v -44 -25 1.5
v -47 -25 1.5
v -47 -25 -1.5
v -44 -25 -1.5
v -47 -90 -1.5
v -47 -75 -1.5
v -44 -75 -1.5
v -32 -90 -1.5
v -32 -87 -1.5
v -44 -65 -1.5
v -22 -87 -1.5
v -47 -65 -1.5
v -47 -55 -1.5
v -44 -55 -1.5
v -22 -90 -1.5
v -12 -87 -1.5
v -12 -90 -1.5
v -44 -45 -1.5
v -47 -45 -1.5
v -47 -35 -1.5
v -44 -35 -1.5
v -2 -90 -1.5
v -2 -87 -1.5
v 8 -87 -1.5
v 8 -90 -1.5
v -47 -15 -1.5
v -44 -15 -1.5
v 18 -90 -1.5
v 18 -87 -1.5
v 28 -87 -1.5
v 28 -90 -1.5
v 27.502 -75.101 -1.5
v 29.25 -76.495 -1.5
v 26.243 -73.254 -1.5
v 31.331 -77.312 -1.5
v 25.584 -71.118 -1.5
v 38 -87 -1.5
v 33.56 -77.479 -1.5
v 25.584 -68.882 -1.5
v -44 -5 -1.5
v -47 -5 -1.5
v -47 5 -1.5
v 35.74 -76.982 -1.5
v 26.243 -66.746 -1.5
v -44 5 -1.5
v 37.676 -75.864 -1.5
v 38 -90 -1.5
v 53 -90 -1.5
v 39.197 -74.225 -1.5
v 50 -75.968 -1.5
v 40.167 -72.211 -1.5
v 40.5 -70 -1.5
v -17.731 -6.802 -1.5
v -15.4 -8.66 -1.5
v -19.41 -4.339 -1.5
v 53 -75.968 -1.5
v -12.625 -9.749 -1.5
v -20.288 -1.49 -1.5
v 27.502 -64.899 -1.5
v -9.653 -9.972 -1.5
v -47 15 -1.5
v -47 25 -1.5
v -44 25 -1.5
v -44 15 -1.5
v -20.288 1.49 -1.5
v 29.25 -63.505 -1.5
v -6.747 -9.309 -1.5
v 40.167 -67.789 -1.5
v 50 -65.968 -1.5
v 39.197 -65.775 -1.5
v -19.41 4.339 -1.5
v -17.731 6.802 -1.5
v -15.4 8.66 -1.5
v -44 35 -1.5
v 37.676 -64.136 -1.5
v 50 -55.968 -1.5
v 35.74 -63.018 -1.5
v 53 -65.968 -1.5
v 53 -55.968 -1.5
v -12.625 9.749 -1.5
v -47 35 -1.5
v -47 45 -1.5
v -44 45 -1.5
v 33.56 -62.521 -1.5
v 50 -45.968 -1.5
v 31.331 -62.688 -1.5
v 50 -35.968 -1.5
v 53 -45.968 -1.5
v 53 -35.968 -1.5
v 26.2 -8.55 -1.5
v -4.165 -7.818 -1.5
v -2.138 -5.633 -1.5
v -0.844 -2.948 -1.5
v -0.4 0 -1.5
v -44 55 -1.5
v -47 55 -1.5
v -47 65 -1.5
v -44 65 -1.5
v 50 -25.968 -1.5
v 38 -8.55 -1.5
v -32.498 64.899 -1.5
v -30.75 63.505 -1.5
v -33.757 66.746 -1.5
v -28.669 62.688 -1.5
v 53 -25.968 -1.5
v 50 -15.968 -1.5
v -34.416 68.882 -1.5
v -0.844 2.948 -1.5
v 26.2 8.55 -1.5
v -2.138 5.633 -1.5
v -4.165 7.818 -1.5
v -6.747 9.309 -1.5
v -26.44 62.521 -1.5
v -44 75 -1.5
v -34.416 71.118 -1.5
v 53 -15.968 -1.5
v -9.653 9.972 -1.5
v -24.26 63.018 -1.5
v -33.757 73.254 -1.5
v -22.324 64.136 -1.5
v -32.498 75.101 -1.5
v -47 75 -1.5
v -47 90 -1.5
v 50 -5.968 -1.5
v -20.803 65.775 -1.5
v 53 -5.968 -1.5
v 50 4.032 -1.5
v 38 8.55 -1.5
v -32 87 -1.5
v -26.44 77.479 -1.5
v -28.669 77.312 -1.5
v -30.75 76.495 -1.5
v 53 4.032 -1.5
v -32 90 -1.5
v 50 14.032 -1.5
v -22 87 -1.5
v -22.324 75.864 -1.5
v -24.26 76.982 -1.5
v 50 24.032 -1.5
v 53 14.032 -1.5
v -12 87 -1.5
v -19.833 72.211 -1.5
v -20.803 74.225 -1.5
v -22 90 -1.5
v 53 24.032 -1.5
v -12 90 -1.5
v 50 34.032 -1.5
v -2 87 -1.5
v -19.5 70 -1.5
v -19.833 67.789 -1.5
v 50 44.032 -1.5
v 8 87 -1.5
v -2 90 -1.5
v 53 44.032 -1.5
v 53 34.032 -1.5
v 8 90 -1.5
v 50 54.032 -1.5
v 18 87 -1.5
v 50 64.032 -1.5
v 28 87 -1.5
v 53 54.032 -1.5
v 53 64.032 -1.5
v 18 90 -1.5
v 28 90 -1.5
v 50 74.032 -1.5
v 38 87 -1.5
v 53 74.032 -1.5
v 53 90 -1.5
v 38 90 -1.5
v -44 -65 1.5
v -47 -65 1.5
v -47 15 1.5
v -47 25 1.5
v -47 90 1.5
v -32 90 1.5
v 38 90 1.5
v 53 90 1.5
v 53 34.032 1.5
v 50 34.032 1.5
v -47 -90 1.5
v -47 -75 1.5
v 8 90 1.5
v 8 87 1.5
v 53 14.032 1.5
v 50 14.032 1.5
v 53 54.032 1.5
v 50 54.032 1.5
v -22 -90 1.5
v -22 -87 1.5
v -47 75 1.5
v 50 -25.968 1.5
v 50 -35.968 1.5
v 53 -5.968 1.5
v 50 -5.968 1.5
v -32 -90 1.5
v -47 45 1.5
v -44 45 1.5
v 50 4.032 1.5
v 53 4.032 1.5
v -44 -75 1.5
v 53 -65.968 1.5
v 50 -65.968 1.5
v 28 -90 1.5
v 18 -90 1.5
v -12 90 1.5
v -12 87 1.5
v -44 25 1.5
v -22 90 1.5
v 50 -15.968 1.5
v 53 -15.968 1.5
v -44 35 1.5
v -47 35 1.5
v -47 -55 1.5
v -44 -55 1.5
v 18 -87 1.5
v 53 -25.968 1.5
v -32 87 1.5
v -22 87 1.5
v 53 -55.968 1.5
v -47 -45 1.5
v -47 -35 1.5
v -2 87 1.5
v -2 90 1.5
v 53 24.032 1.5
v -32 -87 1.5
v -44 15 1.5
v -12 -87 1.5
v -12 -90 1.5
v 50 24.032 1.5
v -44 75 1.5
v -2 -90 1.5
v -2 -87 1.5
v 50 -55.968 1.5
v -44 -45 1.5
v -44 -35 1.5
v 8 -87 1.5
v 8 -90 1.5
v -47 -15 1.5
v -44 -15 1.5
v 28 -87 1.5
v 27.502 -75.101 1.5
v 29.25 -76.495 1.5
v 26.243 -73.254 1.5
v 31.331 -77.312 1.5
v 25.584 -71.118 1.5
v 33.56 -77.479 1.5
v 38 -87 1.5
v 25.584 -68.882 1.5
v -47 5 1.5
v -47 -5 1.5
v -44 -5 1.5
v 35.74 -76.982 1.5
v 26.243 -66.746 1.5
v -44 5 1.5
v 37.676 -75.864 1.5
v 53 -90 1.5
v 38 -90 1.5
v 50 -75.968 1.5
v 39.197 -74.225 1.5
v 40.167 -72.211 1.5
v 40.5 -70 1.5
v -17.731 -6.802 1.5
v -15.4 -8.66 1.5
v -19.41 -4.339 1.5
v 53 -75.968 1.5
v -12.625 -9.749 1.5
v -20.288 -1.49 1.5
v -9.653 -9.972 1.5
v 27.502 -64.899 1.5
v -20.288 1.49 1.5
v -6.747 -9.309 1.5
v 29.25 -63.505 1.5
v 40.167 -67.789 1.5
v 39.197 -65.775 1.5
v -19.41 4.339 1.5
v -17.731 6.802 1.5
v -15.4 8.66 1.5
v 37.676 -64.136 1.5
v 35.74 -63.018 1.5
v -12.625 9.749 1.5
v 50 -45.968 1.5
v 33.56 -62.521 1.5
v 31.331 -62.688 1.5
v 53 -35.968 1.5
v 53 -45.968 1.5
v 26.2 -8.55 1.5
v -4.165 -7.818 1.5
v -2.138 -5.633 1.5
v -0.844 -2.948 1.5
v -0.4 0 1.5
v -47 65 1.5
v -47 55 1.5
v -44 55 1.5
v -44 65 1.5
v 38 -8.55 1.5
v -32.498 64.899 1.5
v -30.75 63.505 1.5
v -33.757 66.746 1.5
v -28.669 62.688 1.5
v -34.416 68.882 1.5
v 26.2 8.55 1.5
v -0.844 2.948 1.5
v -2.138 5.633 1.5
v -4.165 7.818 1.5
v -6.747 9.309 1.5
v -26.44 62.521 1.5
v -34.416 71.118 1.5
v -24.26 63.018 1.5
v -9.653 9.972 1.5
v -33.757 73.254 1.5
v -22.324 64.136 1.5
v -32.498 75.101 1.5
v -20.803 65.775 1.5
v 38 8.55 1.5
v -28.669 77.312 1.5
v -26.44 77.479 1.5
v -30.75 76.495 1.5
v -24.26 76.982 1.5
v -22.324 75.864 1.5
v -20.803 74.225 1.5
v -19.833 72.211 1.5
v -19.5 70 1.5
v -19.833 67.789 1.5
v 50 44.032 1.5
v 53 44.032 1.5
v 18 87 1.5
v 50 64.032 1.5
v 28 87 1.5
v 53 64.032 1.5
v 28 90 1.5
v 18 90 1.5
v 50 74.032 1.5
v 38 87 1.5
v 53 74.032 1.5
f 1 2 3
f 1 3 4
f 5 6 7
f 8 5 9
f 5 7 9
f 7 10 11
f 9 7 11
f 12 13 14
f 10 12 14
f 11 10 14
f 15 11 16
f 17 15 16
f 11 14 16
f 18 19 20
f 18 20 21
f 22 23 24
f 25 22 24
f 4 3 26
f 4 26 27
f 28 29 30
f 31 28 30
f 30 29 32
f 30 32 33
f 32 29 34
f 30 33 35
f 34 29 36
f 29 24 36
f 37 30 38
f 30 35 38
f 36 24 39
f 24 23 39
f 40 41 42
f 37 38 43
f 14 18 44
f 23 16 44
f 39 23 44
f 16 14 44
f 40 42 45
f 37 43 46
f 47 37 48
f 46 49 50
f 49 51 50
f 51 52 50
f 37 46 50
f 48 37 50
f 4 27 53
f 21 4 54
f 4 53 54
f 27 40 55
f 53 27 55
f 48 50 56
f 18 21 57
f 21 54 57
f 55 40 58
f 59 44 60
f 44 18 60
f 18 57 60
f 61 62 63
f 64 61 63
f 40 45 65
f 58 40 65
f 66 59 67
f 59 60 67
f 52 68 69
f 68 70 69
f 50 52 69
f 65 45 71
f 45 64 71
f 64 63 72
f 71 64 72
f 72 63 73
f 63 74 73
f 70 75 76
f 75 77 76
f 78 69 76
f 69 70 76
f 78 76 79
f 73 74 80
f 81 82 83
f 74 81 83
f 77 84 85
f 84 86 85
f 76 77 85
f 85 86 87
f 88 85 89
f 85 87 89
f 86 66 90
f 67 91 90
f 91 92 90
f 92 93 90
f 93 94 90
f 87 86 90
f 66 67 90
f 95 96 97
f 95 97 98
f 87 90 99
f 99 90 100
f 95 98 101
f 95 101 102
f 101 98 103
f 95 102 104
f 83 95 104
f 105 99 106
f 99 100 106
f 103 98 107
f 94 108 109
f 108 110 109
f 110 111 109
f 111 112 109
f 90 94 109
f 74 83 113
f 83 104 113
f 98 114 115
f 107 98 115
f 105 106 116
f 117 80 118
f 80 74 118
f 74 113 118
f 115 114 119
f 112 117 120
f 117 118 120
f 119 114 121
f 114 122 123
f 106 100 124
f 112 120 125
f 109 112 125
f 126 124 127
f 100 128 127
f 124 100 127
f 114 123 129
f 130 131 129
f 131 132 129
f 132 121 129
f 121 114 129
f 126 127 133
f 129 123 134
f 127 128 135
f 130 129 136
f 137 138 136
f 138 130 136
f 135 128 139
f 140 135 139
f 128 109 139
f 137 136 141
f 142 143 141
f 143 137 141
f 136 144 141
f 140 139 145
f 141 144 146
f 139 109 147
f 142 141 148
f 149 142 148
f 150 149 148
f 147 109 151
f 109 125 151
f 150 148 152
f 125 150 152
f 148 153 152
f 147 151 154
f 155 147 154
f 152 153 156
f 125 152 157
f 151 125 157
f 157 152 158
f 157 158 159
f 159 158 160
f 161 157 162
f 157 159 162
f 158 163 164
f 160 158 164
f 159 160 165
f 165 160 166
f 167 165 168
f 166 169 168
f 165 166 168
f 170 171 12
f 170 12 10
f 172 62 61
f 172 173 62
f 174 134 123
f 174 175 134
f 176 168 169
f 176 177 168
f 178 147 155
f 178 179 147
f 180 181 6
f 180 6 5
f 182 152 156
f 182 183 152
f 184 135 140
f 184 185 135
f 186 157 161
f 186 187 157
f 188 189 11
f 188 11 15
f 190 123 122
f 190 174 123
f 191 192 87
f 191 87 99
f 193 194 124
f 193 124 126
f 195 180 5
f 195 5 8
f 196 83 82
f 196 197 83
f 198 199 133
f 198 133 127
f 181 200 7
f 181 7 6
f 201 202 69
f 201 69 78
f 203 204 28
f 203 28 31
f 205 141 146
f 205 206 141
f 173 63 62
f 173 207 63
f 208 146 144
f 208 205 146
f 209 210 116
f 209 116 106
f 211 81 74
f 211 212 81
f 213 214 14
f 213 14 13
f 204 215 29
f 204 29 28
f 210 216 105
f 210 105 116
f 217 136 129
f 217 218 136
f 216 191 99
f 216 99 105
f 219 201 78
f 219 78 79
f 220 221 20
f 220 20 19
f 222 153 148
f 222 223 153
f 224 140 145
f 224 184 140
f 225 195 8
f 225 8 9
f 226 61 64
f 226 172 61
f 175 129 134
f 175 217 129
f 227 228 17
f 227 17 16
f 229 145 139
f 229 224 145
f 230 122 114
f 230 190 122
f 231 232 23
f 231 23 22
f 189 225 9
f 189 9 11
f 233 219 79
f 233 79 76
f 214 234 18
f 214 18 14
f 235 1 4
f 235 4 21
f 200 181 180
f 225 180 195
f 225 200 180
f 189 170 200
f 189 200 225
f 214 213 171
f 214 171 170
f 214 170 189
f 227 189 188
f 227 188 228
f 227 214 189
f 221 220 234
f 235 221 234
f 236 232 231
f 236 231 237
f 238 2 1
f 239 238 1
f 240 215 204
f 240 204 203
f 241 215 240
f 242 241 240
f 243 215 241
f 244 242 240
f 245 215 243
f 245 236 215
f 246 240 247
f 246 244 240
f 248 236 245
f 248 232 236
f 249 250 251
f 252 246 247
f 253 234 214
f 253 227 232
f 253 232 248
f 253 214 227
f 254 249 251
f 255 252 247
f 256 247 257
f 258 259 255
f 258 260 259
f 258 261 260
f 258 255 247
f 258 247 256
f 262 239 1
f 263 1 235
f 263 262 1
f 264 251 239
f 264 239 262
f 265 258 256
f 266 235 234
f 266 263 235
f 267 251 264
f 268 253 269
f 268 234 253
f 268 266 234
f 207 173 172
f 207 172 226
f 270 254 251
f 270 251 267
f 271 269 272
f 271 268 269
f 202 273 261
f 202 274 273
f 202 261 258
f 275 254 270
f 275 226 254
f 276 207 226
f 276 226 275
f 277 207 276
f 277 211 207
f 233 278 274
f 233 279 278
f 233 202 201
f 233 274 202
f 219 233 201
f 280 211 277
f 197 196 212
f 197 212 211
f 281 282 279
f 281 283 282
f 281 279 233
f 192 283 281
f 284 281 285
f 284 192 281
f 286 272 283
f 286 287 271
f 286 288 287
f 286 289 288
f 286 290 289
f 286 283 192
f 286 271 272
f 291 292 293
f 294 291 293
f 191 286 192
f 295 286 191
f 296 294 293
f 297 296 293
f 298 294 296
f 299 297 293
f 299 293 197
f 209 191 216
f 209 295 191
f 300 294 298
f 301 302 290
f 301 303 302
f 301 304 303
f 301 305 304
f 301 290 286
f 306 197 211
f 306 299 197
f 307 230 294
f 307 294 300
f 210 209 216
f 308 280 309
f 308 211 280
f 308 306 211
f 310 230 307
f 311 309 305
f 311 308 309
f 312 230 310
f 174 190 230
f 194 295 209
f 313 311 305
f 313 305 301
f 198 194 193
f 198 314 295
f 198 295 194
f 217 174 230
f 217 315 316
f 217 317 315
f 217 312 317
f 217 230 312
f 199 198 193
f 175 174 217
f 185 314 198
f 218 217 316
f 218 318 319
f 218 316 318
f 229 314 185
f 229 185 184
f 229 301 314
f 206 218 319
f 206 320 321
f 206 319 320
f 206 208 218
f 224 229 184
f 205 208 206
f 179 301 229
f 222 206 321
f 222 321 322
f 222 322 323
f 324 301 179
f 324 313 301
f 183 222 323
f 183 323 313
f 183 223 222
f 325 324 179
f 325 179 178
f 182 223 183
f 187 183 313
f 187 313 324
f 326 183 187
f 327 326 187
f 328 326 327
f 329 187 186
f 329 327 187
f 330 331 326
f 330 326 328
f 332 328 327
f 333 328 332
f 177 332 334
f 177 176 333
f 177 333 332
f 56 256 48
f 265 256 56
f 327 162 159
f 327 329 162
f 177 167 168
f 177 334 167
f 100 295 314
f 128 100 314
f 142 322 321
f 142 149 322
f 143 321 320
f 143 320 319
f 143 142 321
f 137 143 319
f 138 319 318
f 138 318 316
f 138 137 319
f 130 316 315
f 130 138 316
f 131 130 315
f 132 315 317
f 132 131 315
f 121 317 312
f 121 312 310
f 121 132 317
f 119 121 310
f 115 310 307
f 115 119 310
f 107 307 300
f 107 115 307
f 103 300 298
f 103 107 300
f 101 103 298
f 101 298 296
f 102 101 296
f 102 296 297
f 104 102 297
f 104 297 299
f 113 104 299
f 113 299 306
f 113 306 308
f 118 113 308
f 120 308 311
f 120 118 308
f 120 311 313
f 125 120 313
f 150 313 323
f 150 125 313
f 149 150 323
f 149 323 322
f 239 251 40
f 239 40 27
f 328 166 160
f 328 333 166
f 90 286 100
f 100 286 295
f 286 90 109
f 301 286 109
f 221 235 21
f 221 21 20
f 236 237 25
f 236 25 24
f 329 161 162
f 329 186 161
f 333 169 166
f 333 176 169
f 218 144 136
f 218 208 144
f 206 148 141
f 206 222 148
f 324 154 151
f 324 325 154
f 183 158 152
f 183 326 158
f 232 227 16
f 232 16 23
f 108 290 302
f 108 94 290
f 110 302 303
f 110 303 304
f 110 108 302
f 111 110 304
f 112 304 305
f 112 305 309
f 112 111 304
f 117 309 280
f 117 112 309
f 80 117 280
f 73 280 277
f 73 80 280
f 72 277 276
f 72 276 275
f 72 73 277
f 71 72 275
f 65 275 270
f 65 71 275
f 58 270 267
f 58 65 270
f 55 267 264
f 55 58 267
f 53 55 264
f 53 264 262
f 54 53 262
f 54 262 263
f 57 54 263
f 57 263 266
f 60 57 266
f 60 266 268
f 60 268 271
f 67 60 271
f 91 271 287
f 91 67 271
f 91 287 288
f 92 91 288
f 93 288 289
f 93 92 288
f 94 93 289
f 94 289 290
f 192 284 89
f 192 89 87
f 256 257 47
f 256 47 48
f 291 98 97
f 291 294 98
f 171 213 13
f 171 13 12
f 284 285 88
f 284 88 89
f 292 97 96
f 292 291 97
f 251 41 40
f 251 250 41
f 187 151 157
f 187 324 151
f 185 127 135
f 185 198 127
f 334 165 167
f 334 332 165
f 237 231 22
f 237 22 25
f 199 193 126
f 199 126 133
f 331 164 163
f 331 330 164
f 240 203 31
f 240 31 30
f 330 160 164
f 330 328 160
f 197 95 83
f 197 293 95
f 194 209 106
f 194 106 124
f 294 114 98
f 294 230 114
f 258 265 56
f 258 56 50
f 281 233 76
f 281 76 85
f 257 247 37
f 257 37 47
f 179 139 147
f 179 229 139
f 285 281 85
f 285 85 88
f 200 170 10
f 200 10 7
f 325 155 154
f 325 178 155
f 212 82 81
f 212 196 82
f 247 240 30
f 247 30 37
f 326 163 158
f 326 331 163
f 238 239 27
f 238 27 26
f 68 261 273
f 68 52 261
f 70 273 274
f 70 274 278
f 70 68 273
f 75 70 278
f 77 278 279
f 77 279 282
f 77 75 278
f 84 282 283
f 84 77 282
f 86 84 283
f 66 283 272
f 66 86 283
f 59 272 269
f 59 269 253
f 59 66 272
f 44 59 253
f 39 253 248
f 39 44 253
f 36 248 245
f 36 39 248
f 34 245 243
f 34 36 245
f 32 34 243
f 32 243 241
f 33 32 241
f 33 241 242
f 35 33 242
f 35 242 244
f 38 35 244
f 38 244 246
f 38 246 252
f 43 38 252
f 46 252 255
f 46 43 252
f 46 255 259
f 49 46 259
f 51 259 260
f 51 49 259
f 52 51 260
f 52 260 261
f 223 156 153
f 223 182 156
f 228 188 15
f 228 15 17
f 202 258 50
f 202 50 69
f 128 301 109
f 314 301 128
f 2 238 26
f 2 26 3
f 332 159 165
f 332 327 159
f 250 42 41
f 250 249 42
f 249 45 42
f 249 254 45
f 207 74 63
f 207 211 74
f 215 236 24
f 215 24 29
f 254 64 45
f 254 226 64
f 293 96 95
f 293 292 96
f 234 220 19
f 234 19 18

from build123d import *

# Parameters (mm, degrees)
F0_R     = 10
F0_R_2   = 7.5
F0_W     = 11.8
F0_H     = 17.1
F1_DEPTH = 1.5


# Not quite as in the source:
# - ends of sketch curves that miss each other by under 0.0002 mm in the source are joined


with BuildPart() as f1:
    # F0 (on Top) → F1 (new body, symmetric)
    with BuildSketch(Plane.XY):
        Polygon((-46.9999983907, 3.8743e-06), (-46.9999983907, -4.9999961257), (-43.9999983907, -4.9999961257), (-43.9999983907, -14.9999961257), (-46.9999983907, -14.9999961257), (-46.9999983907, -24.9999961257), (-43.9999983907, -24.9999961257), (-43.9999983907, -34.9999961257), (-46.9999983907, -34.9999961257), (-46.9999983907, -44.9999961257), (-43.9999983907, -44.9999961257), (-43.9999983907, -54.9999961257), (-46.9999983907, -54.9999961257), (-46.9999983907, -64.9999961257), (-43.9999983907, -64.9999961257), (-43.9999983907, -74.9999961257), (-46.9999983907, -74.9999961257), (-46.9999983907, -89.9999961257), (-31.9999983907, -89.9999961257), (-31.9999983907, -86.9999961257), (-21.9999983907, -86.9999961257), (-21.9999983907, -89.9999961257), (-11.9999983907, -89.9999961257), (-11.9999983907, -86.9999961257), (-1.9999983907, -86.9999961257), (-1.9999983907, -89.9999961257), (8.0000016093, -89.9999961257), (8.0000016093, -86.9999961257), (18.0000016093, -86.9999961257), (18.0000016093, -89.9999961257), (28.0000016093, -89.9999961257), (28.0000016093, -86.9999961257), (38.0000016093, -86.9999961257), (38.0000016093, -89.9999961257), (53.0000016093, -89.9999961257), (53.0000030994, -75.968132019), (50.0000030994, -75.968132019), (50.0000030994, -65.968132019), (53.0000030994, -65.968132019), (53.0000030994, -55.968132019), (50.0000030994, -55.968132019), (50.0000030994, -45.968132019), (53.0000030994, -45.968132019), (53.0000030994, -35.968132019), (50.0000030994, -35.968132019), (50.0000030994, -25.968132019), (53.0000030994, -25.968132019), (53.0000030994, -15.968132019), (50.0000030994, -15.968132019), (50.0000030994, -5.968132019), (53.0000030994, -5.968132019), (53.0000030994, 3.8743e-06), (53.0000030994, 4.031867981), (50.0000030994, 4.031867981), (50.0000030994, 14.031867981), (53.0000030994, 14.031867981), (53.0000030994, 24.031867981), (50.0000030994, 24.031867981), (50.0000030994, 34.031867981), (53.0000030994, 34.031867981), (53.0000030994, 44.031867981), (50.0000030994, 44.031867981), (50.0000030994, 54.031867981), (53.0000030994, 54.031867981), (53.0000030994, 64.031867981), (50.0000030994, 64.031867981), (50.0000030994, 74.031867981), (53.0000030994, 74.031867981), (53.0000030994, 90.0000038743), (38.0000016093, 90.0000035763), (38.0000016093, 87.0000035763), (28.0000016093, 87.0000035763), (28.0000016093, 90.0000035763), (18.0000016093, 90.0000035763), (18.0000016093, 87.0000035763), (8.0000016093, 87.0000035763), (8.0000016093, 90.0000035763), (-1.9999983907, 90.0000035763), (-1.9999983907, 87.0000035763), (-11.9999983907, 87.0000035763), (-11.9999983907, 90.0000035763), (-21.9999983907, 90.0000035763), (-21.9999983907, 87.0000035763), (-31.9999983907, 87.0000035763), (-31.9999983907, 90.0000035763), (-46.9999983907, 90.0000035763), (-46.9999983907, 75.0000038743), (-43.9999983907, 75.0000038743), (-43.9999983907, 65.0000038743), (-46.9999983907, 65.0000038743), (-46.9999983907, 55.0000038743), (-43.9999983907, 55.0000038743), (-43.9999983907, 45.0000038743), (-46.9999983907, 45.0000038743), (-46.9999983907, 35.0000038743), (-43.9999983907, 35.0000038743), (-43.9999983907, 25.0000038743), (-46.9999983907, 25.0000038743), (-46.9999983907, 15.0000038743), (-43.9999983907, 15.0000038743), (-43.9999983907, 5.0000038743), (-46.9999983907, 5.0000038743), align=None)
        with Locations((-10.3999983907, 3.8743e-06)):
            Circle(F0_R, mode=Mode.SUBTRACT)
        with Locations((33.0000030994, -69.9999961257)):
            Circle(F0_R_2, mode=Mode.SUBTRACT)
        with Locations((-26.9999983907, 70.0000035763)):
            Circle(F0_R_2, mode=Mode.SUBTRACT)
        with Locations((32.1000030994, 3.8743e-06)):
            Rectangle(F0_W, F0_H, mode=Mode.SUBTRACT)
    extrude(amount=F1_DEPTH, both=True)


solid = f1.part
